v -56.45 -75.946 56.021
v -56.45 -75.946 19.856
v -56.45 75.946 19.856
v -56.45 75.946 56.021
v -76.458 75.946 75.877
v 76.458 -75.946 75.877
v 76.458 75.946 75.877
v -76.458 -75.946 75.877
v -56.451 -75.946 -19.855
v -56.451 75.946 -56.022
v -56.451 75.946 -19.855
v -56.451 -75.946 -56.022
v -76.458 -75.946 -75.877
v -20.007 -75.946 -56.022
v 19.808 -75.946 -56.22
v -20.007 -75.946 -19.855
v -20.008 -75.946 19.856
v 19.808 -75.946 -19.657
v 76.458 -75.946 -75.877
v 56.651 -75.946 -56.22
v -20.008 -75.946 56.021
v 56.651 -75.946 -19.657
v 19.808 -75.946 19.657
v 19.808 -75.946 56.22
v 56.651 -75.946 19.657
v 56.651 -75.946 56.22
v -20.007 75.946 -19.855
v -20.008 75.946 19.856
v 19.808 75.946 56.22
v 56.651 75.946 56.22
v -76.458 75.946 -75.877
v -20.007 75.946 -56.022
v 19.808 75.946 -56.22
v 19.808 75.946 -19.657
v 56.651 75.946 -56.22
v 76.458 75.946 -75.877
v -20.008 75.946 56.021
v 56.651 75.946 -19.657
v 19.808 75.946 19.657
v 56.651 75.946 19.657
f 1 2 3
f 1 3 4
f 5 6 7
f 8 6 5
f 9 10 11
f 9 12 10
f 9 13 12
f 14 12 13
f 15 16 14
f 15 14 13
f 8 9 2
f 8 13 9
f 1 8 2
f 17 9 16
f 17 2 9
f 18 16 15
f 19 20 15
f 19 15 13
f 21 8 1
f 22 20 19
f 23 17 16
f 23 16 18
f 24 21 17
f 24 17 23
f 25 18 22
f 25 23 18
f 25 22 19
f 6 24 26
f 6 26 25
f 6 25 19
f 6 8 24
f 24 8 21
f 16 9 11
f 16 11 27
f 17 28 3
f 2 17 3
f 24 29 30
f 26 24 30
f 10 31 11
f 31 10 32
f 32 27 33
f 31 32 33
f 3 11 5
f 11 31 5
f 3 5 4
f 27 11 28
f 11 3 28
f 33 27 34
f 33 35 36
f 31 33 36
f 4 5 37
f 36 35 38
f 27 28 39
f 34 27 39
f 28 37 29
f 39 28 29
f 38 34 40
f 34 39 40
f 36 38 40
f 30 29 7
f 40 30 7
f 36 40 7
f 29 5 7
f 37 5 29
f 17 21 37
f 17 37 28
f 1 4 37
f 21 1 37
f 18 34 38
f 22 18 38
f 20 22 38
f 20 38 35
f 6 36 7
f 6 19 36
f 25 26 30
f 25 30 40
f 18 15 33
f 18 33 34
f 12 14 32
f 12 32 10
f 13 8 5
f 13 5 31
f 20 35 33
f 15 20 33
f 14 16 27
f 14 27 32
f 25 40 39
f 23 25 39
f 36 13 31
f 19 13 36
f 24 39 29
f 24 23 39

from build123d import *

# Parameters (mm, degrees)
F1_DEPTH = 75.946


with BuildPart() as f1:
    # F0 (on Front) → F1 (new body, symmetric)
    with BuildSketch(Plane.XZ):
        Polygon((76.458305, 75.877115), (-76.458305, 75.877115), (-56.450146, 56.021046), (-20.00816, 56.021046), (-20.00816, 19.85607), (0, 0), (19.80776, 19.657193), (19.80776, 56.219922), (56.650545, 56.219922), align=None)
        Polygon((-56.450146, 56.021046), (-76.458305, 75.877115), (-76.458305, -75.877115), (-56.451009, -56.021903), (-56.451009, -19.855212), (-20.007296, -19.855212), (0, 0), (-20.00816, 19.85607), (-56.450146, 19.85607), align=None)
        Polygon((-56.451009, -56.021903), (-76.458305, -75.877115), (76.458305, -75.877115), (56.650545, -56.219922), (19.80776, -56.219922), (19.80776, -19.657193), (0, 0), (-20.007296, -19.855212), (-20.007296, -56.021903), align=None)
        Polygon((76.458305, -75.877115), (76.458305, 75.877115), (56.650545, 56.219922), (56.650545, 19.657193), (19.80776, 19.657193), (0, 0), (19.80776, -19.657193), (56.650545, -19.657193), (56.650545, -56.219922), align=None)
    extrude(amount=F1_DEPTH, both=True)


solid = f1.part
